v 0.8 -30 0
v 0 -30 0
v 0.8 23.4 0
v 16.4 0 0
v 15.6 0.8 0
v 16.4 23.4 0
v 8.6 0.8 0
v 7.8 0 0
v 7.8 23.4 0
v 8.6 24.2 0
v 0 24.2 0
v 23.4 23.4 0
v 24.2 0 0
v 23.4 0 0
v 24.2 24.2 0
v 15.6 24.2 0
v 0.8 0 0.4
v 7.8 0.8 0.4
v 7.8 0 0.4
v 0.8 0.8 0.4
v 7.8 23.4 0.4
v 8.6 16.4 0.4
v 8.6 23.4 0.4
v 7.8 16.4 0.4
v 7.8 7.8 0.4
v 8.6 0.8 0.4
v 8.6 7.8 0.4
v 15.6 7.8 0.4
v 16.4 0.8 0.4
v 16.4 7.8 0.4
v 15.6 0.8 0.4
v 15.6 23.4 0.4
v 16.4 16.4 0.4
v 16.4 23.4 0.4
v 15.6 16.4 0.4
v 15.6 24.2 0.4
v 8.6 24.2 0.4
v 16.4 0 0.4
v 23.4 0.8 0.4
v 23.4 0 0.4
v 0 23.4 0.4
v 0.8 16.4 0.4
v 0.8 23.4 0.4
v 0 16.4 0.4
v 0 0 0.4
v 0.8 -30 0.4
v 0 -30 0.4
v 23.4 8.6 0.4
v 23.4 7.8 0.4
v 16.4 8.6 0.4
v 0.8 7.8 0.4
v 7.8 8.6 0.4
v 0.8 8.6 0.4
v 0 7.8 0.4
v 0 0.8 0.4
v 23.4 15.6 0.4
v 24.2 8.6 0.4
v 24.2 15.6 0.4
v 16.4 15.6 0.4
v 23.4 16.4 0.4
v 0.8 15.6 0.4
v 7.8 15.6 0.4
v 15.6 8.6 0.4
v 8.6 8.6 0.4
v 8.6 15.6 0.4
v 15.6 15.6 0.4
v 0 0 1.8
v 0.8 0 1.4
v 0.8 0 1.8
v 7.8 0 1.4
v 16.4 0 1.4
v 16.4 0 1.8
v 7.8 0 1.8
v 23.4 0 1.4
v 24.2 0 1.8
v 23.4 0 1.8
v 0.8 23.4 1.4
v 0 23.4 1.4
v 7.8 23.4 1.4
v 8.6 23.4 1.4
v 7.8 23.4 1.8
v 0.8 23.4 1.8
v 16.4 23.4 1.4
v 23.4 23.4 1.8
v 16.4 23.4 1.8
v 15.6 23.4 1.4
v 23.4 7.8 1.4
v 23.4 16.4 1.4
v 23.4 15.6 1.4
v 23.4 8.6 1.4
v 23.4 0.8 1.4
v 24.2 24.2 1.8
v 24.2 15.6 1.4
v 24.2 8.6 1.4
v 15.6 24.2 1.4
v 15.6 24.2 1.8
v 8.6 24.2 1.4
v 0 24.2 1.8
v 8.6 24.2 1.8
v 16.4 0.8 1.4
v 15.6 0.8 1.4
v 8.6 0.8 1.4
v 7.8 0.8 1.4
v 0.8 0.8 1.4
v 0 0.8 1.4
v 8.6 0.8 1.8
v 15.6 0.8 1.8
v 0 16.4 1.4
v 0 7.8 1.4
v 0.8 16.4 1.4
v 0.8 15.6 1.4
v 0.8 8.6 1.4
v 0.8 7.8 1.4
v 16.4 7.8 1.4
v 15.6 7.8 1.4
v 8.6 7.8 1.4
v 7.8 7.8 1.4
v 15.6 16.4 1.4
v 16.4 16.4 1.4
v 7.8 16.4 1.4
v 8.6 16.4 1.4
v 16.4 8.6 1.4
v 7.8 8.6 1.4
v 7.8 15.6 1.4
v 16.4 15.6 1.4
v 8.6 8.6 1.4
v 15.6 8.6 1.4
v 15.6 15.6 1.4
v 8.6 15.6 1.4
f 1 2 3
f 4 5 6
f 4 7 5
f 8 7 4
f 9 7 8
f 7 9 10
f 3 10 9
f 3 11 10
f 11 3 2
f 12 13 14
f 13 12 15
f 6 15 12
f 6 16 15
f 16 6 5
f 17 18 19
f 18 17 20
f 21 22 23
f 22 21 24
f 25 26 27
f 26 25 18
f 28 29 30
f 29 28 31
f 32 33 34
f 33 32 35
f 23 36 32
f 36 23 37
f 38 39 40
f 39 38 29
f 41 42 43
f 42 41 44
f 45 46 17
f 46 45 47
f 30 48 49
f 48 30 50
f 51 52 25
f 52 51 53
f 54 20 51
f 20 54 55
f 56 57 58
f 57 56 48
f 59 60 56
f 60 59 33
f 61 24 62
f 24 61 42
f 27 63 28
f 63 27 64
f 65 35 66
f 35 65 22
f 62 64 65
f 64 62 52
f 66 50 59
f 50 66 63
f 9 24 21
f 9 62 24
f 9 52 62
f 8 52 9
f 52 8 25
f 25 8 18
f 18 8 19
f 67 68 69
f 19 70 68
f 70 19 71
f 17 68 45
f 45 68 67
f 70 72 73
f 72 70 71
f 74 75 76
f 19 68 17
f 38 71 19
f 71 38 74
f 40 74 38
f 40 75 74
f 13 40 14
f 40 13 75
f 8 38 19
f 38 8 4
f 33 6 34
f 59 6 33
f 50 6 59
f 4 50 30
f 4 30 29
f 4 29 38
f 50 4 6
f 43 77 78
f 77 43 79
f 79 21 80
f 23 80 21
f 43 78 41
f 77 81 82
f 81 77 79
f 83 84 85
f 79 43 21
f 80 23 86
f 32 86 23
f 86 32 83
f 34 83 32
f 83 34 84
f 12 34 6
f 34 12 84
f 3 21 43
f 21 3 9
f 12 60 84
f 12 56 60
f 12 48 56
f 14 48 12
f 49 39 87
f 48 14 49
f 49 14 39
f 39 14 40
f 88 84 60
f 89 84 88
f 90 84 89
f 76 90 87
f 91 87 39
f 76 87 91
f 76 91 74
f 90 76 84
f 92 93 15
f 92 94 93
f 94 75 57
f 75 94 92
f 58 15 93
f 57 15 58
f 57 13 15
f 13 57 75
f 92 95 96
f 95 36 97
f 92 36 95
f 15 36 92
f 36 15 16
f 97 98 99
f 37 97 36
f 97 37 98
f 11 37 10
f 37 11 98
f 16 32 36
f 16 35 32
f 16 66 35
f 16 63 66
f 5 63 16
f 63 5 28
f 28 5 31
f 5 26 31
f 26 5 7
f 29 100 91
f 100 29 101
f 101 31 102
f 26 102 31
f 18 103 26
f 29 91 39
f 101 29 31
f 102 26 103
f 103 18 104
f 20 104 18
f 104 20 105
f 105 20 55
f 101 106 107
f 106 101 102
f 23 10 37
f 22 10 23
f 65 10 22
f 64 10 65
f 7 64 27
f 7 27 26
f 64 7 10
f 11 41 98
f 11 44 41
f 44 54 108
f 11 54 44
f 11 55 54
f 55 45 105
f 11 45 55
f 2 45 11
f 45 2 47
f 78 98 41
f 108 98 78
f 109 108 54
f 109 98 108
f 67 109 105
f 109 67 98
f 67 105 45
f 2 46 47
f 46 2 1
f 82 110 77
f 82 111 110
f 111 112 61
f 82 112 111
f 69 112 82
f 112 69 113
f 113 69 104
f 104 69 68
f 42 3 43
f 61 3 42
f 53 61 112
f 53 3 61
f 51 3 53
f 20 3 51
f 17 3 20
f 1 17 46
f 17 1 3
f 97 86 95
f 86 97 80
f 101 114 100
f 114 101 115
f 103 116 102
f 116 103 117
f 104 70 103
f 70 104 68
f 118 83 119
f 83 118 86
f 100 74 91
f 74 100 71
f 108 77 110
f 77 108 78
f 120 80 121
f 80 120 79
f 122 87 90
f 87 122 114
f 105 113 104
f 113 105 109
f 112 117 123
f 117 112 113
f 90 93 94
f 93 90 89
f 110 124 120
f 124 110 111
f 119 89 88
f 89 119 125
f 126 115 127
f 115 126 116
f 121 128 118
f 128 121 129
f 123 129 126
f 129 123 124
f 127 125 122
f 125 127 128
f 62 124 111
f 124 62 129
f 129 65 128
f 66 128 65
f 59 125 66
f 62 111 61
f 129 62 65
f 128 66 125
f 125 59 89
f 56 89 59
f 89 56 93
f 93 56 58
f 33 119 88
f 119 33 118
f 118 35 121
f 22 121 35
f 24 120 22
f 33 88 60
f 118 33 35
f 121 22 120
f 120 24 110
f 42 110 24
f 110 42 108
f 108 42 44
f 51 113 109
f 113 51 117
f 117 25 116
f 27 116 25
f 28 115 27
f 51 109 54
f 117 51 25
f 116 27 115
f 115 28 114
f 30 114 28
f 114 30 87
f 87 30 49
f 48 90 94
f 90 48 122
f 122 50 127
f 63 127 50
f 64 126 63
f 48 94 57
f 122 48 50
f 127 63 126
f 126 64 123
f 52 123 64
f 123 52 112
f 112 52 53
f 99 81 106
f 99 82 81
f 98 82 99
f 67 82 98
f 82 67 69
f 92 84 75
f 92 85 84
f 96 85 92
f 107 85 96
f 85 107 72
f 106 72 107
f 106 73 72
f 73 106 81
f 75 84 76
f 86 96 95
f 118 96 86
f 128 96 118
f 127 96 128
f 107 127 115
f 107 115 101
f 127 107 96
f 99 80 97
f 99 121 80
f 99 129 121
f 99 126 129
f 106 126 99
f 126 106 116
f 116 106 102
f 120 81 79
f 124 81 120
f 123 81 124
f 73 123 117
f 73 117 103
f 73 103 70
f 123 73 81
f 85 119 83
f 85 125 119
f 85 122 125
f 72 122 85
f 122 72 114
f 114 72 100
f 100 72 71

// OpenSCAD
// file: ../../api/v3/reporting.scad
//////////////////////////////////////////////////////////////////////
// LibFile: reporting.scad
// Project: Grid Stack
// FileGroup: API v3 Reporting
// FileSummary: Console report for immutable direct and positive-gap coupons.
// Role: Records the exact environment, dimensions, support strategy, path
//       lengths, qualification status, and deposited-layer counts.
// Requires: API v3 indexes, mathematics, and path generator.
// Exports: report_structural_coupon_object().
//////////////////////////////////////////////////////////////////////

function _bridge_status3(span, process) =
    span <= process[PX3_BRIDGE_MAX]
        ? "within_owner_tested_limit"
        : "exploratory_beyond_owner_tested_limit";

module report_structural_coupon_object(object, report_level = "full") {
    material = object[SCO_MATERIAL];
    nozzle = object[SCO_NOZZLE];
    printer = object[SCO_PRINTER];
    process = object[SCO_PROCESS];
    boundary = object[SCO_BOUNDARY];
    gap = object[SCO_CLEAR_GAP];
    strategy = object[SCO_SUPPORT_STRATEGY];

    echo("--- Grid Stack immutable structural coupon ---");
    echo(str("Object: ", object[SCO_NAME], " revision ", object[SCO_REVISION]));
    echo(str("API/schema: ", object[SCO_REQUIRED_API], "/",
        object[SCO_SCHEMA_VERSION]));
    echo(str("Release/base commit: ", object[SCO_SOURCE_RELEASE], " / ",
        object[SCO_FRAMEWORK_BASE_COMMIT]));
    echo(str("Material/nozzle/printer: ", material[MAT3_FAMILY], " / ",
        nozzle[NZ3_DIAMETER], " mm / ", printer[PRN3_NAME]));
    echo(str("Cells: ", boundary[B3_CELLS_X], " x ", boundary[B3_CELLS_Y]));
    echo(str("Clear spans: ", boundary[B3_CLEAR_SPAN_X], " x ",
        boundary[B3_CLEAR_SPAN_Y], " mm"));
    echo(str("Span status: ",
        _bridge_status3(boundary[B3_CLEAR_SPAN_X], process)));
    echo(str("Outside size: ", boundary_size_x3(boundary, process, nozzle),
        " x ", boundary_size_y3(boundary, process, nozzle), " mm"));
    echo(str("Primitive trace: ", trace_width3(nozzle), " x ",
        trace_height3(process), " mm"));
    echo(str("Structural strand: ", strand_width3(process, nozzle), " x ",
        strand_height3(process), " mm"));
    echo(str("Clear vertical gap: ", gap, " mm"));
    echo(str("Support strategy: ", strategy));
    echo(str("Total modeled height: ", coupon_total_height3(object), " mm"));

    if (report_level == "full") {
        if (strategy == "direct_orthogonal") {
            lower = coupon_path(
                boundary, process, nozzle, 0, object[SCO_LEAD_IN]
            );
            upper = coupon_path(boundary, process, nozzle, 90, 0);
            echo(str("Lower/upper path lengths: ", path_length3(lower),
                " / ", path_length3(upper), " mm"));
            echo(str("Deposited layers: ", 2 * process[PX3_HEIGHT_PASSES]));
        }
        else {
            witness = coupon_path(
                boundary, process, nozzle, 90, object[SCO_LEAD_IN]
            );
            riser = coupon_path(boundary, process, nozzle, 0, 0);
            test = coupon_path(boundary, process, nozzle, 90, 0);
            echo(str("Witness/riser/test path lengths: ",
                path_length3(witness), " / ", path_length3(riser), " / ",
                path_length3(test), " mm"));
            echo(str("Riser deposited layers: ", round(gap_layer_count3(object))));
            echo(str("Total deposited layers: ",
                2 * process[PX3_HEIGHT_PASSES] +
                round(gap_layer_count3(object))));
        }
        echo(str("Status: ", object[SCO_STATUS]));
        echo(str("Notes: ", object[SCO_NOTES]));
    }
}
// file: ../../api/v3/validation.scad
//////////////////////////////////////////////////////////////////////
// LibFile: validation.scad
// Project: Grid Stack
// FileGroup: API v3 Validation
// FileSummary: Validates immutable environment records, count boundaries,
//              support strategy, path continuity, and layer quantization.
// Role: Rejects incompatible or physically floating recipes before geometry
//       is generated.
// Requires: API v3 indexes, mathematics, and path generator.
// Exports: validate_structural_coupon_object().
//////////////////////////////////////////////////////////////////////

module _validate_path3(points, boundary, orientation, lead_in) {
    run_count = orientation == 0
        ? boundary_strand_count_y3(boundary)
        : boundary_strand_count_x3(boundary);

    assert(len(points) == expected_coupon_point_count3(run_count, lead_in),
        "API v3 coupon path has an unexpected point count.");
    assert(!path_has_zero_segment3(points),
        "API v3 coupon path contains a zero-length segment.");
    assert(path_axis_aligned3(points),
        "API v3 coupon path must remain axis-aligned.");
    assert(points[0] != points[len(points) - 1],
        "API v3 coupon path must remain open.");
}

module validate_structural_coupon_object(object) {
    assert(object[SCO_REQUIRED_API] == GRID_STACK_API_VERSION,
        "Saved coupon requires a different Grid Stack API version.");
    assert(object[SCO_SCHEMA_VERSION] == GRID_STACK_COUPON_SCHEMA_VERSION,
        "Saved coupon requires a different coupon schema version.");
    assert(GRID_STACK_RECTANGULAR_FRAMEWORK_VERSION == 2,
        "Saved coupon requires rectangular framework version 2.");

    material = object[SCO_MATERIAL];
    nozzle = object[SCO_NOZZLE];
    printer = object[SCO_PRINTER];
    process = object[SCO_PROCESS];
    boundary = object[SCO_BOUNDARY];
    gap = object[SCO_CLEAR_GAP];
    lead_in = object[SCO_LEAD_IN];
    strategy = object[SCO_SUPPORT_STRATEGY];

    assert(nozzle[NZ3_DIAMETER] > 0,
        "Saved coupon nozzle diameter must be positive.");
    assert(process[PX3_LAYER_H] > 0,
        "Saved coupon layer height must be positive.");
    assert(process[PX3_WIDTH_PASSES] >= 2,
        "Saved coupon structural width requires at least two passes.");
    assert(process[PX3_HEIGHT_PASSES] >= 2,
        "Saved coupon structural height requires at least two layers.");
    assert(process[PX3_MATERIAL] == material[MAT3_NAME],
        "Saved coupon process/material references do not match.");
    assert(process[PX3_NOZZLE] == nozzle[NZ3_NAME],
        "Saved coupon process/nozzle references do not match.");
    assert(process[PX3_PRINTER] == printer[PRN3_NAME],
        "Saved coupon process/printer references do not match.");
    assert(boundary[B3_CELLS_X] > 0 && boundary[B3_CELLS_Y] > 0,
        "Saved coupon cell counts must be positive.");
    assert(boundary[B3_CLEAR_SPAN_X] > 0 &&
           boundary[B3_CLEAR_SPAN_Y] > 0,
        "Saved coupon clear spans must be positive.");
    assert(lead_in >= 0,
        "Saved coupon lead-in cannot be negative.");
    assert(gap >= 0,
        "Saved coupon clear gap cannot be negative.");
    assert(nearly_equal3(gap_layer_count3(object), round(gap_layer_count3(object))),
        "Saved coupon clear gap must equal a whole deposited-layer count.");
    assert(
        (strategy == "direct_orthogonal" && nearly_equal3(gap, 0)) ||
        (strategy == "witness_riser_bridge" && gap > 0),
        "Saved coupon support strategy does not match its clear gap."
    );

    if (strategy == "direct_orthogonal") {
        lower = coupon_path(boundary, process, nozzle, 0, lead_in);
        upper = coupon_path(boundary, process, nozzle, 90, 0);
        _validate_path3(lower, boundary, 0, lead_in);
        _validate_path3(upper, boundary, 90, 0);
        entry = lead_in > 0 ? 1 : 0;
        assert(nearly_equal3(point_distance_2d3(lower[entry], upper[0]), 0),
            "Direct upper path must start on the lower entry crossing.");
    }
    else {
        witness = coupon_path(boundary, process, nozzle, 90, lead_in);
        riser = coupon_path(boundary, process, nozzle, 0, 0);
        test = coupon_path(boundary, process, nozzle, 90, 0);
        _validate_path3(witness, boundary, 90, lead_in);
        _validate_path3(riser, boundary, 0, 0);
        _validate_path3(test, boundary, 90, 0);
        entry = lead_in > 0 ? 1 : 0;
        assert(nearly_equal3(point_distance_2d3(witness[entry], riser[0]), 0),
            "Riser path must start on the witness entry crossing.");
        assert(nearly_equal3(point_distance_2d3(riser[0], test[0]), 0),
            "Upper test path must start on the riser entry crossing.");
        for (i = [0 : len(test) - 1])
            assert(nearly_equal3(point_distance_2d3(test[i], witness[i + entry]), 0),
                "Upper test path must align directly above the witness path.");
    }

    echo("GRID STACK API V3 COUPON VALIDATION: PASS");
}
// file: ../../api/v3/geometry.scad
//////////////////////////////////////////////////////////////////////
// LibFile: geometry.scad
// Project: Grid Stack
// FileGroup: API v3 Printable Geometry
// FileSummary: Creates square-ended structural paths, direct-contact coupons,
//              positive witness/riser/bridge coupons, and simple diagnostics.
// Role: Supplies all geometry used by immutable API v3 recipes without
//       importing mutable workbench geometry.
// Requires: API v3 mathematics and ordered axis-aligned paths.
// Exports: render_direct_coupon(), render_positive_gap_coupon(), and
//          render_coupon_path_debug().
//////////////////////////////////////////////////////////////////////

module _segment_2d3(a, b, width) {
    horizontal = nearly_equal3(a[1], b[1]);
    vertical = nearly_equal3(a[0], b[0]);

    assert(horizontal || vertical,
        "API v3 printable segments must be horizontal or vertical.");
    assert(!nearly_equal3(point_distance_2d3(a, b), 0),
        "API v3 printable segments must have nonzero length.");

    if (horizontal)
        translate([min(a[0], b[0]) - width / 2, a[1] - width / 2])
            square([abs(b[0] - a[0]) + width, width]);
    else
        translate([a[0] - width / 2, min(a[1], b[1]) - width / 2])
            square([width, abs(b[1] - a[1]) + width]);
}

module _path_2d3(points, width) {
    union()
        for (i = [0 : len(points) - 2])
            _segment_2d3(points[i], points[i + 1], width);
}

module _structural_path3(points, process, nozzle) {
    linear_extrude(height = strand_height3(process), convexity = 10)
        _path_2d3(points, strand_width3(process, nozzle));
}

module render_direct_coupon(lower, upper, process, nozzle) {
    union() {
        _structural_path3(lower, process, nozzle);
        translate([0, 0, strand_height3(process)])
            _structural_path3(upper, process, nozzle);
    }
}

module render_positive_gap_coupon(
    witness, riser, test, process, nozzle, clear_gap
) {
    union() {
        _structural_path3(witness, process, nozzle);

        translate([0, 0, strand_height3(process)])
            linear_extrude(height = clear_gap, convexity = 10)
                _path_2d3(riser, strand_width3(process, nozzle));

        translate([0, 0, strand_height3(process) + clear_gap])
            _structural_path3(test, process, nozzle);
    }
}

module _debug_path3(points, z, width) {
    translate([0, 0, z])
        linear_extrude(height = 0.04)
            _path_2d3(points, width);
}

module render_coupon_path_debug(
    lower, upper, riser, process, clear_gap = 0
) {
    width = max(0.12, trace_height3(process));
    _debug_path3(lower, 0, width);
    if (len(riser) > 0)
        _debug_path3(riser, strand_height3(process), width);
    _debug_path3(
        upper,
        strand_height3(process) + clear_gap,
        width
    );
}
// file: ../../api/v3/paths.scad
//////////////////////////////////////////////////////////////////////
// LibFile: paths.scad
// Project: Grid Stack
// FileGroup: API v3 Path Generation
// FileSummary: Generates one open rectangular serpentine centerline from a
//              count boundary for X- or Y-running structural paths.
// Role: Preserves parallel runs, square connectors, optional single lead-in,
//       and one uninterrupted ordered point list per deposited layer.
// Requires: API v3 indexes and mathematics.
// Exports: coupon_path() and expected_coupon_point_count3().
//////////////////////////////////////////////////////////////////////

function _x_rows3(row, count, x_min, x_max, y_min, pitch) =
    row >= count
        ? []
        : let(
            y = y_min + row * pitch,
            x_end = row % 2 == 0 ? x_max : x_min,
            row_end = [x_end, y],
            connector_end = [x_end, y + pitch]
        )
        concat(
            [row_end],
            row < count - 1 ? [connector_end] : [],
            _x_rows3(row + 1, count, x_min, x_max, y_min, pitch)
        );

function _y_columns3(column, count, x_min, y_min, y_max, pitch) =
    column >= count
        ? []
        : let(
            x = x_min + column * pitch,
            y_end = column % 2 == 0 ? y_max : y_min,
            column_end = [x, y_end],
            connector_end = [x + pitch, y_end]
        )
        concat(
            [column_end],
            column < count - 1 ? [connector_end] : [],
            _y_columns3(column + 1, count, x_min, y_min, y_max, pitch)
        );

function expected_coupon_point_count3(run_count, lead_in = 0) =
    2 * run_count + (lead_in > 0 ? 1 : 0);

function coupon_path(
    boundary, process, nozzle, orientation = 0, lead_in = 0
) =
    assert(orientation == 0 || orientation == 90,
        "API v3 coupon orientation must be 0 or 90 degrees.")
    assert(lead_in >= 0,
        "API v3 coupon lead-in cannot be negative.")
    let(
        width = strand_width3(process, nozzle),
        x_min = width / 2,
        y_min = width / 2,
        x_max = boundary_size_x3(boundary, process, nozzle) - width / 2,
        y_max = boundary_size_y3(boundary, process, nozzle) - width / 2,
        entry = [x_min, y_min],
        prefix = lead_in > 0
            ? (orientation == 0
                ? [[x_min - lead_in, y_min], entry]
                : [[x_min, y_min - lead_in], entry])
            : [entry]
    )
    orientation == 0
        ? concat(
            prefix,
            _x_rows3(
                0, boundary_strand_count_y3(boundary),
                x_min, x_max, y_min,
                boundary_pitch_y3(boundary, process, nozzle)
            )
        )
        : concat(
            prefix,
            _y_columns3(
                0, boundary_strand_count_x3(boundary),
                x_min, y_min, y_max,
                boundary_pitch_x3(boundary, process, nozzle)
            )
        );
// file: ../../api/v3/math.scad
//////////////////////////////////////////////////////////////////////
// LibFile: math.scad
// Project: Grid Stack
// FileGroup: API v3 Mathematics
// FileSummary: Pure trace, strand, boundary, path, and layer-count helpers.
// Role: Keeps API v3 calculations isolated and reproducible without importing
//       mutable workbench mathematics.
// Requires: API v3 indexes.
// Exports: nearly_equal3(), trace/strand dimensions, boundary dimensions,
//          path inspection, gap-layer count, and total-height helpers.
//////////////////////////////////////////////////////////////////////

function nearly_equal3(a, b, epsilon = 0.000001) = abs(a - b) <= epsilon;

function trace_width3(nozzle) = nozzle[NZ3_DIAMETER];
function trace_height3(process) = process[PX3_LAYER_H];
function strand_width3(process, nozzle) =
    trace_width3(nozzle) * process[PX3_WIDTH_PASSES];
function strand_height3(process) =
    trace_height3(process) * process[PX3_HEIGHT_PASSES];

function boundary_strand_count_x3(boundary) = boundary[B3_CELLS_X] + 1;
function boundary_strand_count_y3(boundary) = boundary[B3_CELLS_Y] + 1;
function boundary_pitch_x3(boundary, process, nozzle) =
    boundary[B3_CLEAR_SPAN_X] + strand_width3(process, nozzle);
function boundary_pitch_y3(boundary, process, nozzle) =
    boundary[B3_CLEAR_SPAN_Y] + strand_width3(process, nozzle);
function boundary_size_x3(boundary, process, nozzle) =
    boundary[B3_CELLS_X] * boundary[B3_CLEAR_SPAN_X] +
    boundary_strand_count_x3(boundary) * strand_width3(process, nozzle);
function boundary_size_y3(boundary, process, nozzle) =
    boundary[B3_CELLS_Y] * boundary[B3_CLEAR_SPAN_Y] +
    boundary_strand_count_y3(boundary) * strand_width3(process, nozzle);

function point_distance_2d3(a, b) =
    sqrt(pow(b[0] - a[0], 2) + pow(b[1] - a[1], 2));
function path_length3(points, i = 0) =
    i >= len(points) - 1
        ? 0
        : point_distance_2d3(points[i], points[i + 1]) +
          path_length3(points, i + 1);
function path_has_zero_segment3(points, i = 0) =
    i >= len(points) - 1
        ? false
        : nearly_equal3(point_distance_2d3(points[i], points[i + 1]), 0)
            ? true
            : path_has_zero_segment3(points, i + 1);
function segment_axis_aligned3(a, b) =
    nearly_equal3(a[0], b[0]) || nearly_equal3(a[1], b[1]);
function path_axis_aligned3(points, i = 0) =
    i >= len(points) - 1
        ? true
        : segment_axis_aligned3(points[i], points[i + 1]) &&
          path_axis_aligned3(points, i + 1);

function gap_layer_count3(object) =
    object[SCO_CLEAR_GAP] / trace_height3(object[SCO_PROCESS]);
function coupon_total_height3(object) =
    2 * strand_height3(object[SCO_PROCESS]) + object[SCO_CLEAR_GAP];
// file: ../../api/v3/schema.scad
//////////////////////////////////////////////////////////////////////
// LibFile: schema.scad
// Project: Grid Stack
// FileGroup: API v3 Data Model
// FileSummary: Constructors for self-contained immutable structural coupons.
// Role: Makes every geometry-affecting environment and object value explicit
//       inside the saved recipe rather than resolving mutable catalog names.
// Exports: material_spec(), nozzle_spec(), printer_spec(),
//          structural_process_profile(), count_boundary(), and
//          structural_coupon_object().
//////////////////////////////////////////////////////////////////////

function material_spec(
    name, family, flexibility, status = "in_use", notes = ""
) = [name, family, flexibility, status, notes];

function nozzle_spec(
    name, diameter, construction = "brass", status = "in_use", notes = ""
) = [name, diameter, construction, status, notes];

function printer_spec(
    name,
    manufacturer = "",
    model = "",
    motion_system = "",
    build_surface = "",
    status = "unrecorded",
    notes = ""
) = [
    name, manufacturer, model, motion_system,
    build_surface, status, notes
];

function structural_process_profile(
    name,
    material_name,
    nozzle_name,
    printer_name,
    layer_height,
    width_passes,
    height_passes,
    bridge_max,
    qualification,
    revision,
    notes = ""
) = [
    name, material_name, nozzle_name, printer_name,
    layer_height, width_passes, height_passes, bridge_max,
    qualification, revision, notes
];

// Function: count_boundary()
// Synopsis: Stores clear-opening counts and clear spans for one rectangle.
function count_boundary(
    name,
    cells_x,
    cells_y,
    clear_span_x,
    clear_span_y,
    notes = ""
) = [name, cells_x, cells_y, clear_span_x, clear_span_y, notes];

// Function: structural_coupon_object()
// Synopsis: Constructs one permanent coupon recipe.
// Description:
//   framework_base_commit records the last accepted repository state used to
//   begin the API implementation. The Git commit containing this recipe is the
//   authoritative complete source; a file cannot embed its own future hash.
function structural_coupon_object(
    name,
    revision,
    required_api_version,
    coupon_schema_version,
    source_release,
    framework_base_commit,
    material,
    nozzle,
    printer,
    process,
    boundary,
    clear_vertical_gap,
    lead_in,
    support_strategy,
    status = "calibration",
    notes = ""
) = [
    name,
    revision,
    required_api_version,
    coupon_schema_version,
    source_release,
    framework_base_commit,
    material,
    nozzle,
    printer,
    process,
    boundary,
    clear_vertical_gap,
    lead_in,
    support_strategy,
    status,
    notes
];
// file: ../../api/v3/indices.scad
//////////////////////////////////////////////////////////////////////
// LibFile: indices.scad
// Project: Grid Stack
// FileGroup: API v3 Data Model
// FileSummary: Named indexes for immutable structural-coupon records.
// Role: Prevents unexplained numeric indexes from entering saved recipes and
//       keeps API version 3 independent of mutable workbench indexes.
// Exports: MAT3_*, NZ3_*, PRN3_*, PX3_*, B3_*, and SCO_* constants.
//////////////////////////////////////////////////////////////////////

MAT3_NAME = 0;
MAT3_FAMILY = 1;
MAT3_FLEXIBILITY = 2;
MAT3_STATUS = 3;
MAT3_NOTES = 4;

NZ3_NAME = 0;
NZ3_DIAMETER = 1;
NZ3_CONSTRUCTION = 2;
NZ3_STATUS = 3;
NZ3_NOTES = 4;

PRN3_NAME = 0;
PRN3_MANUFACTURER = 1;
PRN3_MODEL = 2;
PRN3_MOTION_SYSTEM = 3;
PRN3_BUILD_SURFACE = 4;
PRN3_STATUS = 5;
PRN3_NOTES = 6;

PX3_NAME = 0;
PX3_MATERIAL = 1;
PX3_NOZZLE = 2;
PX3_PRINTER = 3;
PX3_LAYER_H = 4;
PX3_WIDTH_PASSES = 5;
PX3_HEIGHT_PASSES = 6;
PX3_BRIDGE_MAX = 7;
PX3_QUALIFICATION = 8;
PX3_REVISION = 9;
PX3_NOTES = 10;

B3_NAME = 0;
B3_CELLS_X = 1;
B3_CELLS_Y = 2;
B3_CLEAR_SPAN_X = 3;
B3_CLEAR_SPAN_Y = 4;
B3_NOTES = 5;

SCO_NAME = 0;
SCO_REVISION = 1;
SCO_REQUIRED_API = 2;
SCO_SCHEMA_VERSION = 3;
SCO_SOURCE_RELEASE = 4;
SCO_FRAMEWORK_BASE_COMMIT = 5;
SCO_MATERIAL = 6;
SCO_NOZZLE = 7;
SCO_PRINTER = 8;
SCO_PROCESS = 9;
SCO_BOUNDARY = 10;
SCO_CLEAR_GAP = 11;
SCO_LEAD_IN = 12;
SCO_SUPPORT_STRATEGY = 13;
SCO_STATUS = 14;
SCO_NOTES = 15;
// file: ../../api/grid_stack_v3.scad
//////////////////////////////////////////////////////////////////////
// LibFile: grid_stack_v3.scad
// Project: Grid Stack
// FileGroup: Versioned Public Interface
// FileSummary: Immutable API version 3 for rectangular count-boundary
//              structural coupons, including positive witness/riser gaps.
// Role: Reconstructs saved coupon recipes without Customizer state or mutable
//       workbench catalogs. Incompatible behavior requires a new API file.
// Exports: API/schema constants, record constructors, validation, reporting,
//          and structural_coupon_render().
//////////////////////////////////////////////////////////////////////

GRID_STACK_API_VERSION = 3;
GRID_STACK_COUPON_SCHEMA_VERSION = 1;
GRID_STACK_RECTANGULAR_FRAMEWORK_VERSION = 2;
GRID_STACK_RELEASE = "1.0.0";

include <v3/indices.scad>
include <v3/schema.scad>
include <v3/math.scad>
include <v3/paths.scad>
include <v3/geometry.scad>
include <v3/validation.scad>
include <v3/reporting.scad>

// Module: structural_coupon_render()
// Synopsis: Validates, reports, and renders one immutable coupon recipe.
// Arguments:
//   object = Record returned by structural_coupon_object().
//   mode = print, path_debug, or report_only.
//   report_level = summary or full.
module structural_coupon_render(
    object,
    mode = "print",
    report_level = "full"
) {
    validate_structural_coupon_object(object);
    report_structural_coupon_object(object, report_level);

    boundary = object[SCO_BOUNDARY];
    process = object[SCO_PROCESS];
    nozzle = object[SCO_NOZZLE];
    lead_in = object[SCO_LEAD_IN];
    clear_gap = object[SCO_CLEAR_GAP];
    strategy = object[SCO_SUPPORT_STRATEGY];

    if (strategy == "direct_orthogonal") {
        lower = coupon_path(boundary, process, nozzle, 0, lead_in);
        upper = coupon_path(boundary, process, nozzle, 90, 0);

        if (mode == "print")
            render_direct_coupon(lower, upper, process, nozzle);
        else if (mode == "path_debug")
            render_coupon_path_debug(lower, upper, [], process);
        else if (mode == "report_only")
            echo("Grid Stack API v3 report-only mode: no geometry generated.");
        else
            assert(false, str("Unknown API v3 render mode: ", mode));
    }
    else if (strategy == "witness_riser_bridge") {
        witness = coupon_path(boundary, process, nozzle, 90, lead_in);
        riser = coupon_path(boundary, process, nozzle, 0, 0);
        test = coupon_path(boundary, process, nozzle, 90, 0);

        if (mode == "print")
            render_positive_gap_coupon(
                witness, riser, test, process, nozzle, clear_gap
            );
        else if (mode == "path_debug")
            render_coupon_path_debug(witness, test, riser, process, clear_gap);
        else if (mode == "report_only")
            echo("Grid Stack API v3 report-only mode: no geometry generated.");
        else
            assert(false, str("Unknown API v3 render mode: ", mode));
    }
    else
        assert(false, str("Unknown coupon support strategy: ", strategy));
}
// main file
//////////////////////////////////////////////////////////////////////
// LibFile: coupon-3x3-span7-gap1-pla-plus-0p4-v1.scad
// Project: Grid Stack
// FileGroup: Immutable Structural Coupon
// FileSummary: 3 x 3 PLA+ coupon with 7 mm clear XY spans and 1 mm
//              clear vertical gap using witness_riser_bridge geometry.
// Role: Permanently reconstructs one calibration object without Customizer
//       state or mutable workbench catalog lookup.
// FrameworkBaseCommit: 4b5e564
// Requires: Grid Stack API version 3 and coupon schema version 1.
// Output: Printable continuous-path structural coupon geometry.
//////////////////////////////////////////////////////////////////////

include <../../api/grid_stack_v3.scad>

assert(GRID_STACK_API_VERSION == 3,
    "This recipe requires Grid Stack API version 3.");
assert(GRID_STACK_COUPON_SCHEMA_VERSION == 1,
    "This recipe requires coupon schema version 1.");
assert(GRID_STACK_RECTANGULAR_FRAMEWORK_VERSION == 2,
    "This recipe requires rectangular framework version 2.");

saved_material = material_spec(
    name = "PLA_PLUS",
    family = "PLA+",
    flexibility = "rigid",
    status = "in_use",
    notes = "Exact material family selected for the coupon matrix."
);

saved_nozzle = nozzle_spec(
    name = "BRASS_0P4",
    diameter = 0.4,
    construction = "brass",
    status = "in_use",
    notes = "Nominal nozzle diameter used to derive the 0.8 mm strand width."
);

saved_printer = printer_spec(
    name = "UNRECORDED_PRINTER_R1",
    manufacturer = "",
    model = "",
    motion_system = "",
    build_surface = "",
    status = "unrecorded",
    notes = "Printer identity was not frozen with this coupon framework."
);

saved_process = structural_process_profile(
    name = "PLA_PLUS_0P4_LH0P2_W2_H2_R1",
    material_name = "PLA_PLUS",
    nozzle_name = "BRASS_0P4",
    printer_name = "UNRECORDED_PRINTER_R1",
    layer_height = 0.2,
    width_passes = 2,
    height_passes = 2,
    bridge_max = 6,
    qualification = "owner_tested_to_6mm",
    revision = 1,
    notes = "Primitive trace 0.4 x 0.2 mm; structural strand 0.8 x 0.4 mm."
);

saved_boundary = count_boundary(
    name = "COUNT_3X3_SPAN7",
    cells_x = 3,
    cells_y = 3,
    clear_span_x = 7,
    clear_span_y = 7,
    notes = "Outside dimensions derive from four strands and three clear openings."
);

saved_coupon = structural_coupon_object(
    name = "COUPON_3X3_SPAN7_GAP1_PLA_PLUS_0P4_V1",
    revision = 1,
    required_api_version = 3,
    coupon_schema_version = 1,
    source_release = "1.0.0",
    framework_base_commit = "4b5e564",
    material = saved_material,
    nozzle = saved_nozzle,
    printer = saved_printer,
    process = saved_process,
    boundary = saved_boundary,
    clear_vertical_gap = 1,
    lead_in = 30,
    support_strategy = "witness_riser_bridge",
    status = "calibration_unprinted",
    notes = "Calibration recipe generated from the frozen Batch 010 framework; record results in a new revision after printing."
);

structural_coupon_render(
    saved_coupon,
    mode = "print",
    report_level = "full"
);
